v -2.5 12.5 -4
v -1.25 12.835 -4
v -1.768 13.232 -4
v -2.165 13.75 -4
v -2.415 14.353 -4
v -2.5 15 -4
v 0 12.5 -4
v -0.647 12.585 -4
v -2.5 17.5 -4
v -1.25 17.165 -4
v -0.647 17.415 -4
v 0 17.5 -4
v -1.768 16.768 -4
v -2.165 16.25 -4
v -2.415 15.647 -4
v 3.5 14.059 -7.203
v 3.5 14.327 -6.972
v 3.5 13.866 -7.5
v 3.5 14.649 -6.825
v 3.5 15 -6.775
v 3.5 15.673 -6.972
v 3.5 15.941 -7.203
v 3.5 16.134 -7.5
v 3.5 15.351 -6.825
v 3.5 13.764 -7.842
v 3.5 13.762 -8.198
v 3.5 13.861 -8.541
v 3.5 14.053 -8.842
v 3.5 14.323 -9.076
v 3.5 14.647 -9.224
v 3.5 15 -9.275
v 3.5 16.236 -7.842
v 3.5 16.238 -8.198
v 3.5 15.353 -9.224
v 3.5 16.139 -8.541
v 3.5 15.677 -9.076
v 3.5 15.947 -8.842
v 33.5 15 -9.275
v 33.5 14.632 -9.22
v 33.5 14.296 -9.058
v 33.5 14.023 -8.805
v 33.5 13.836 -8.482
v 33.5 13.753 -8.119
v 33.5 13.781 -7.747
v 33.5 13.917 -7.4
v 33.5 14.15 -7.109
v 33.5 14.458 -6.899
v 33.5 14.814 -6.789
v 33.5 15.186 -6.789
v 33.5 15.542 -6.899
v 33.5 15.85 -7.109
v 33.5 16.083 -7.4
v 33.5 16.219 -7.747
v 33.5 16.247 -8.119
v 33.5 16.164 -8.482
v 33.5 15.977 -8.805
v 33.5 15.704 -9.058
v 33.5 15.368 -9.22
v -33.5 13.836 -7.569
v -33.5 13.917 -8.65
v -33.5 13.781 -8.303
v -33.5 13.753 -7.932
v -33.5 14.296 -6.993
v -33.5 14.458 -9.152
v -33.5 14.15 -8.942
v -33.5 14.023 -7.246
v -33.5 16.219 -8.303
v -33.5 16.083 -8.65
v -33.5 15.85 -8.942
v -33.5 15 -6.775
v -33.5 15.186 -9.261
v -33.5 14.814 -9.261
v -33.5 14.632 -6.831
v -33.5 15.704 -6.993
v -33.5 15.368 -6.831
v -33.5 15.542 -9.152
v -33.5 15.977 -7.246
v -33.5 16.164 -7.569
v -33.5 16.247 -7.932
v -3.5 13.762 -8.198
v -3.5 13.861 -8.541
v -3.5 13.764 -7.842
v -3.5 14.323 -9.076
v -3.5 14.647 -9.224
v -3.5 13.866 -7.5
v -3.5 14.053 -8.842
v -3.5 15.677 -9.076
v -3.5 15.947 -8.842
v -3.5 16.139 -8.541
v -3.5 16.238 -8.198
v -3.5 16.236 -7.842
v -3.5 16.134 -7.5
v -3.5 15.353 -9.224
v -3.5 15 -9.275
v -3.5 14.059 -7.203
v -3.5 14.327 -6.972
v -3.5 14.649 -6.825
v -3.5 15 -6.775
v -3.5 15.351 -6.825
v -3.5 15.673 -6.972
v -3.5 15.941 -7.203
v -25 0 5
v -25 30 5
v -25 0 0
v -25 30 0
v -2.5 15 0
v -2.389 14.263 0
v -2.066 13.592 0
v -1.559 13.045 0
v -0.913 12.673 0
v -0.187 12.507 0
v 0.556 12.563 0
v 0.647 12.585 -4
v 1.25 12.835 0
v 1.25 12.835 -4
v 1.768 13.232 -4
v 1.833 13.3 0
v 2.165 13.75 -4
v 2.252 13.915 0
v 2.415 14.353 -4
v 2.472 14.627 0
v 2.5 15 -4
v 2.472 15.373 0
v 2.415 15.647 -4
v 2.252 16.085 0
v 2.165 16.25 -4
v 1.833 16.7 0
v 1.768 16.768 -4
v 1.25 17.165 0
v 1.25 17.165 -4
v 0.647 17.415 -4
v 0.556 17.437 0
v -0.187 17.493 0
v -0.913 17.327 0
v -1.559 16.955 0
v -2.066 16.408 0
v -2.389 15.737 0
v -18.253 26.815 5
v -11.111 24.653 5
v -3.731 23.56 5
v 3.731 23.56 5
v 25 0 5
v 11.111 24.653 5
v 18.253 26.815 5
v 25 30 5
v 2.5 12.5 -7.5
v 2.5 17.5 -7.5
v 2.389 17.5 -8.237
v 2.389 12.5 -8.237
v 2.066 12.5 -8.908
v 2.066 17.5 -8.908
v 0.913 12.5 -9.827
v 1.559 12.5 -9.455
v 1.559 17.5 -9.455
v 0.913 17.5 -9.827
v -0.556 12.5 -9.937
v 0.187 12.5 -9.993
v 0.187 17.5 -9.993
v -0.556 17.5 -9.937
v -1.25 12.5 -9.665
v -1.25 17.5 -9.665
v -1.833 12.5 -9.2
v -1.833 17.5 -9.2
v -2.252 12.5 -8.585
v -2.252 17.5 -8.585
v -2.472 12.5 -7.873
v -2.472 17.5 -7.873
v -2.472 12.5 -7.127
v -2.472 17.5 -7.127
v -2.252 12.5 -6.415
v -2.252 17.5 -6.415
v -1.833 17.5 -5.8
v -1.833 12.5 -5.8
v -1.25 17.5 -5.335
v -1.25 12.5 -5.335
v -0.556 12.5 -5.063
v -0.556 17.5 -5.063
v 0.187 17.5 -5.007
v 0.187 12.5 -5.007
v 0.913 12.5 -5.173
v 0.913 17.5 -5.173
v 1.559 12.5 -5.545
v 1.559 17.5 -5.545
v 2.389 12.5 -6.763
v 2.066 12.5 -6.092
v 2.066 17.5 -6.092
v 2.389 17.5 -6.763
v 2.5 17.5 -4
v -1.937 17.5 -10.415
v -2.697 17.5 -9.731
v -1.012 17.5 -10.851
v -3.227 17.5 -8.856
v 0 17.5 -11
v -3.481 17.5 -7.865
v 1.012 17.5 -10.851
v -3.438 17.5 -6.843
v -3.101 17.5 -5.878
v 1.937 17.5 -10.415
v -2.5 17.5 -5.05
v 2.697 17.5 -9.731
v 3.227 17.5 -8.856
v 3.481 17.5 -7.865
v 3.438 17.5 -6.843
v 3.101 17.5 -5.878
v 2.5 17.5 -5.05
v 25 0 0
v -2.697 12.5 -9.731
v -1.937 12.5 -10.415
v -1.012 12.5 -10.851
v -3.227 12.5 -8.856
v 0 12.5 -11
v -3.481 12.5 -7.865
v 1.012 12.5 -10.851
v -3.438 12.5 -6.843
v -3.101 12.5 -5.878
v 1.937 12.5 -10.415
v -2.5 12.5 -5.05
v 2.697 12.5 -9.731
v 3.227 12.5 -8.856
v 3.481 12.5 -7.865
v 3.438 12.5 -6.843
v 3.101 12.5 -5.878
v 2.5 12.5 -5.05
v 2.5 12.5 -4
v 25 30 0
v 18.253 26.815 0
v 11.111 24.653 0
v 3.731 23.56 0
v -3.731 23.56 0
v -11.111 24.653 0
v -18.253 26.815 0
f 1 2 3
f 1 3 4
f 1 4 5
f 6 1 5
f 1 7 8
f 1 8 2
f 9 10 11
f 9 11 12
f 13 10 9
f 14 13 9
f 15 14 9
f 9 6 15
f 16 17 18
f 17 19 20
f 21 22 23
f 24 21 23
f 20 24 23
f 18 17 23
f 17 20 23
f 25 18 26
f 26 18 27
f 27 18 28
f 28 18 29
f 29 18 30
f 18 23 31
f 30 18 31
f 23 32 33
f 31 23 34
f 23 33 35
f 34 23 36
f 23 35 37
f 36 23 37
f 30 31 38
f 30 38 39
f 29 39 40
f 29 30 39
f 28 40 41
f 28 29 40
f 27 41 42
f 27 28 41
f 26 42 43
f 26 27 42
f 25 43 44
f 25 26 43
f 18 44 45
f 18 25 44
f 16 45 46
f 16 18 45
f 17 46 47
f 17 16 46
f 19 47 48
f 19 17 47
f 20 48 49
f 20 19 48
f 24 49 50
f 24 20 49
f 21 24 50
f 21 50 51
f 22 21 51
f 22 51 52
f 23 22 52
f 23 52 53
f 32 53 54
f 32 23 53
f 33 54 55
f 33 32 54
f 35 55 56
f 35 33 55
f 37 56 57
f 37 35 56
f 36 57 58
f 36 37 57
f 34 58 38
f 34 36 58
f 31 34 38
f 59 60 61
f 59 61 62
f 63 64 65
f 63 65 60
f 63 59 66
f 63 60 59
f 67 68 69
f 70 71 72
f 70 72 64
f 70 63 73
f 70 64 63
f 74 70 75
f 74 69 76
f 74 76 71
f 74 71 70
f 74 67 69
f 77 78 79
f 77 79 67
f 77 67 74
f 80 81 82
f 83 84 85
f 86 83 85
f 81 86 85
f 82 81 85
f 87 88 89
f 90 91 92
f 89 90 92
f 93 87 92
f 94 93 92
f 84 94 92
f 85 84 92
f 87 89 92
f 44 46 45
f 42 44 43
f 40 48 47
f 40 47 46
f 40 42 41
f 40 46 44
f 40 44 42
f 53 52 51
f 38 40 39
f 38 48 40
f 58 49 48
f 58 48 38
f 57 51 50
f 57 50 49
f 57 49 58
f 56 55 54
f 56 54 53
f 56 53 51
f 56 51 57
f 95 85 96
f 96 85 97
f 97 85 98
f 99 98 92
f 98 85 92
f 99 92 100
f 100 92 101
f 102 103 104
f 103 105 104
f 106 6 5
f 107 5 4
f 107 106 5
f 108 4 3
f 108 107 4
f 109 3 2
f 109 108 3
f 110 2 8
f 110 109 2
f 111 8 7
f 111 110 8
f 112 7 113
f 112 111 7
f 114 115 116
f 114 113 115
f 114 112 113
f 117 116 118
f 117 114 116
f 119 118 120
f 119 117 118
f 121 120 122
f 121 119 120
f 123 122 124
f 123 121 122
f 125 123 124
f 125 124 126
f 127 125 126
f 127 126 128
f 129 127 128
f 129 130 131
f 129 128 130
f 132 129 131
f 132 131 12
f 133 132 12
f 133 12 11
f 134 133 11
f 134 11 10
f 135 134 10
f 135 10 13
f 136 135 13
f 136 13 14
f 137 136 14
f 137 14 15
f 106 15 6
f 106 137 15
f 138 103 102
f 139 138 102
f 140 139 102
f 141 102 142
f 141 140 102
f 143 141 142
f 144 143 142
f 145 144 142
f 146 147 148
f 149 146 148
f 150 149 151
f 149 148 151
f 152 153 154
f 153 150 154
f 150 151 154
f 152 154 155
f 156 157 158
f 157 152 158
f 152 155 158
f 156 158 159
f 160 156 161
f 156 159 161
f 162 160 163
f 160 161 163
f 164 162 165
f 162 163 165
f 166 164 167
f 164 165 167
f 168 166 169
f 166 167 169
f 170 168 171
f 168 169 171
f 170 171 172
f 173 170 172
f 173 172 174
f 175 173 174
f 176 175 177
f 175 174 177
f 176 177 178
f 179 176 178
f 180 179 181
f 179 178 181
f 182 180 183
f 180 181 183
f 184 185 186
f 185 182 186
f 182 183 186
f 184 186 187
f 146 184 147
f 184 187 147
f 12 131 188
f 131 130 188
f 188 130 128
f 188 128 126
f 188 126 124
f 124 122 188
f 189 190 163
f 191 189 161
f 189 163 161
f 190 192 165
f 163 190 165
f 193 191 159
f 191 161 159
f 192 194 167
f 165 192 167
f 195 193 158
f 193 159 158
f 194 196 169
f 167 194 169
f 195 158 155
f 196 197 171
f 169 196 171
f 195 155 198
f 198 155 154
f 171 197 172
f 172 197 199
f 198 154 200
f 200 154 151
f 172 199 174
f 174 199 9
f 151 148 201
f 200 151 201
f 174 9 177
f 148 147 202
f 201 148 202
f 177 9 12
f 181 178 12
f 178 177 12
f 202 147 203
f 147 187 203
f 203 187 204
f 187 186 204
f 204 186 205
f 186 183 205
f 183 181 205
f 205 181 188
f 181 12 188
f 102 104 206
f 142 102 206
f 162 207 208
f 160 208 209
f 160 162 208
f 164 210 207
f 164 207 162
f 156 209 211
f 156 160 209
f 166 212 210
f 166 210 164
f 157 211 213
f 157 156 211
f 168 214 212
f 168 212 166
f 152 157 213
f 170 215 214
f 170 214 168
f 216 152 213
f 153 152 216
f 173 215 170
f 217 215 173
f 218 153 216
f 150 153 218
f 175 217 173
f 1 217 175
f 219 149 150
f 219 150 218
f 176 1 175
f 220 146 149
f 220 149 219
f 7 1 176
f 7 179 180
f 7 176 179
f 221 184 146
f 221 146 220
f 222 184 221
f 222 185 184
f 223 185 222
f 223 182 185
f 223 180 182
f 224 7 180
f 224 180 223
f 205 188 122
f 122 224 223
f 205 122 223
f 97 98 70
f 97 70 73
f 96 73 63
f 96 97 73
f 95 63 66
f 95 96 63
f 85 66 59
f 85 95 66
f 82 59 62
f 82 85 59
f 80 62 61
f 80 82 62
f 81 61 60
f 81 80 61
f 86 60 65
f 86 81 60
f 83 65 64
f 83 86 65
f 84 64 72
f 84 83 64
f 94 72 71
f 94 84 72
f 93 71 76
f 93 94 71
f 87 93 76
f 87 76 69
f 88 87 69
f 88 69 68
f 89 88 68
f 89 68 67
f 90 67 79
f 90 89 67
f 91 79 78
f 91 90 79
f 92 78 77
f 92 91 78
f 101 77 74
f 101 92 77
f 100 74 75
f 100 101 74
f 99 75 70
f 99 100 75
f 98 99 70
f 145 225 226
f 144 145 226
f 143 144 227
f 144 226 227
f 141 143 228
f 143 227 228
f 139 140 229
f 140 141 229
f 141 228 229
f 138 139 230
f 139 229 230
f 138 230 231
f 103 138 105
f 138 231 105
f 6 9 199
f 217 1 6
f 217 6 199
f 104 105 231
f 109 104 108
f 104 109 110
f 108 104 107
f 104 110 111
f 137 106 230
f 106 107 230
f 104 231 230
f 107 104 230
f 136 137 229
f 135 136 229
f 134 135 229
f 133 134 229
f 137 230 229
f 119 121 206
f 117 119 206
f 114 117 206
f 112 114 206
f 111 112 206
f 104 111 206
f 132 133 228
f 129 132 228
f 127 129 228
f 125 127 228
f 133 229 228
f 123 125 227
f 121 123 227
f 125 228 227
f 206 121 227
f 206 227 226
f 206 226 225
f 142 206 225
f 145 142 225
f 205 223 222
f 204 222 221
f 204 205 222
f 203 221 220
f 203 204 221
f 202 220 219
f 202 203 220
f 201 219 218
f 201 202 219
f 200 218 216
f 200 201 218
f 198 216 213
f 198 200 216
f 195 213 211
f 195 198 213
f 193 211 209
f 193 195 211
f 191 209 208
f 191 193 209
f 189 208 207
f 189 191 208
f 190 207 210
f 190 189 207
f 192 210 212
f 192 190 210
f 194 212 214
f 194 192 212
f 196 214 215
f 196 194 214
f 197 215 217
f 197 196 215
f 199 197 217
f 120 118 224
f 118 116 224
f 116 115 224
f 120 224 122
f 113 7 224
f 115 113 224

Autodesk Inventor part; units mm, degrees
sketch "Sketch1" plane through (0, 0, 0) normal (0, 0, 1) x (1, 0, 0)
  line L0 (-25, 30) -> (-25, 0)
  line L1 (-25, 0) -> (25, 0)
  line L2 (25, 0) -> (25, 30)
  arc A0 (-25, 30) -> (25, 30) centre (0, 74.2226) ccw
  point P0 (0, 0)
  point P1 (0, 0)
  dimension "d0" = 50
  dimension "d1" = 30
  dimension "d2" = 50.8
extrude "Extrusion1" add sketch "Sketch1" along normal blind 5
sketch "Sketch2" plane through (0, 0, 0) normal (0, 0, -1) x (-1, 0, 0)
  line L0 (-25, 0) -> (-25, 30) projected
  line L1 (25, 30) -> (25, 0) projected
  circle A0 centre (0, 15) radius 2.5
  line L2 (25, 0) -> (-25, 0) projected
  point P0 (0, 0)
  point P1 (25, 15)
  point P2 (0, 0)
  dimension "d5" = 5
extrude "Extrusion2" add sketch "Sketch2" along normal blind 4
thread "Thread1" size "12-24 UNC" class "2A" standard "ANSI Unified Screw Threads" full length
ref_plane "Work Plane1" through (-25, 15, 0) normal (0, -1, 0) x (1, 0, 0)
sketch "Sketch3" plane through (-25, 15, 0) normal (0, -1, 0) x (1, 0, 0)
  circle A0 centre (25, -7.5) radius 3.5
  circle A1 centre (25, -7.5) radius 2.5
  line L0 (22.5, -4) -> (27.5, -4) projected
  point P0 (25, 0)
  point P1 (25, -4)
  dimension "d11" = 5
  dimension "d12" = 7
extrude "Extrusion3" add sketch "Sketch3" along normal mid plane 5
thread "Thread2" size "12-24 UNC" class "2B" standard "ANSI Unified Screw Threads" full length
sketch "Sketch4" plane through (0, 12.5, -7.5) normal (0, -1, 0) x (1, 0, 0)
  circle A0 centre (0, 0) radius 3.5 projected
  circle A1 centre (0, 0) radius 2.5 projected
  line L0 (0, 3.5) -> (2.5, 3.5) projected
  line L1 (0, 3.5) -> (2.5, 3.5)
  line L2 (2.5, 3.5) -> (2.5, 2.4495)
  line L3 (0, 3.5) -> (-2.5, 3.5)
  line L4 (-2.5, 3.5) -> (-2.5, 2.4495)
  arc A2 (2.5, 2.4495) -> (0, 3.5) centre (0, 0) ccw
  arc A3 (0, 3.5) -> (-2.5, 2.4495) centre (0, 0) ccw
  point P0 (0, 7.5)
extrude "Extrusion4" add sketch "Sketch4" against normal blind 5 contours A0 L0 L2 | L4 L3 A0
ref_plane "Work Plane2" through (-3.5, 0, 0) normal (-1, 0, 0) x (0, 0, 1)
sketch "Sketch5" plane through (-3.5, 0, 0) normal (-1, 0, 0) x (0, 0, 1)
  line L0 (-5.0505, 17.5) -> (-5.0505, 12.5) projected
  line L1 (-5.0505, 12.5) -> (-5.0505, 12.5) projected
  line L2 (-5.0505, 12.5) -> (-5.0505, 17.5) projected
  line L3 (-5.0505, 17.5) -> (-5.0505, 17.5) projected
  line L4 (-4, 12.5) -> (-4, 15) projected
  line L5 (-4, 15) -> (-4, 12.5) projected
  line L6 (-4, 17.5) -> (-4, 15) projected
  line L7 (-4, 15) -> (-4, 17.5) projected
  line L8 (0, 12.5) -> (0, 17.5) projected
  line L9 (0, 30) -> (0, 0) projected
  line L10 (0, 0) -> (5, 0) projected
  line L11 (5, 30) -> (5, 0) projected
  line L12 (0, 30) -> (5, 30) projected
  line L13 (0, 30) -> (0, 0) projected
  line L14 (-5.0505, 17.5) -> (-11, 17.5) projected
  line L15 (-11, 12.5) -> (-5.0505, 12.5) projected
  circle A0 centre (-8.0253, 15) radius 1.25
  line L16 (-10, 17.5) -> (-5, 17.5) projected
  line L17 (-5, 12.5) -> (-10, 12.5) projected
  dimension "d20" = 2.5
extrude "Extrusion5" add sketch "Sketch5" along normal blind 30 contours A0
ref_plane "Work Plane3" through (3.5, 0, 0) normal (1, 0, 0) x (0, 0, -1)
sketch "Sketch6" plane through (3.5, 0, 0) normal (1, 0, 0) x (0, 0, -1)
  line L0 (0, 0) -> (0, 30) projected
  line L1 (4, 12.5) -> (4, 15) projected
  line L2 (4, 15) -> (4, 12.5) projected
  line L3 (4, 17.5) -> (4, 15) projected
  line L4 (4, 15) -> (4, 17.5) projected
  line L5 (0, 17.5) -> (0, 12.5) projected
  line L6 (11, 17.5) -> (5.0505, 17.5) projected
  line L7 (5.0505, 12.5) -> (11, 12.5) projected
  line L8 (11, 17.5) -> (11, 12.5) projected
  line L9 (5.0505, 17.5) -> (5.0505, 12.5) projected
  circle A0 centre (8.0253, 15) radius 1.25
  point P0 (5.0505, 15)
  point P1 (8.0253, 17.5)
  dimension "d24" = 2.5
extrude "Extrusion6" add sketch "Sketch6" along normal blind 30 contours A0
properties part number "Robot_mouth"
